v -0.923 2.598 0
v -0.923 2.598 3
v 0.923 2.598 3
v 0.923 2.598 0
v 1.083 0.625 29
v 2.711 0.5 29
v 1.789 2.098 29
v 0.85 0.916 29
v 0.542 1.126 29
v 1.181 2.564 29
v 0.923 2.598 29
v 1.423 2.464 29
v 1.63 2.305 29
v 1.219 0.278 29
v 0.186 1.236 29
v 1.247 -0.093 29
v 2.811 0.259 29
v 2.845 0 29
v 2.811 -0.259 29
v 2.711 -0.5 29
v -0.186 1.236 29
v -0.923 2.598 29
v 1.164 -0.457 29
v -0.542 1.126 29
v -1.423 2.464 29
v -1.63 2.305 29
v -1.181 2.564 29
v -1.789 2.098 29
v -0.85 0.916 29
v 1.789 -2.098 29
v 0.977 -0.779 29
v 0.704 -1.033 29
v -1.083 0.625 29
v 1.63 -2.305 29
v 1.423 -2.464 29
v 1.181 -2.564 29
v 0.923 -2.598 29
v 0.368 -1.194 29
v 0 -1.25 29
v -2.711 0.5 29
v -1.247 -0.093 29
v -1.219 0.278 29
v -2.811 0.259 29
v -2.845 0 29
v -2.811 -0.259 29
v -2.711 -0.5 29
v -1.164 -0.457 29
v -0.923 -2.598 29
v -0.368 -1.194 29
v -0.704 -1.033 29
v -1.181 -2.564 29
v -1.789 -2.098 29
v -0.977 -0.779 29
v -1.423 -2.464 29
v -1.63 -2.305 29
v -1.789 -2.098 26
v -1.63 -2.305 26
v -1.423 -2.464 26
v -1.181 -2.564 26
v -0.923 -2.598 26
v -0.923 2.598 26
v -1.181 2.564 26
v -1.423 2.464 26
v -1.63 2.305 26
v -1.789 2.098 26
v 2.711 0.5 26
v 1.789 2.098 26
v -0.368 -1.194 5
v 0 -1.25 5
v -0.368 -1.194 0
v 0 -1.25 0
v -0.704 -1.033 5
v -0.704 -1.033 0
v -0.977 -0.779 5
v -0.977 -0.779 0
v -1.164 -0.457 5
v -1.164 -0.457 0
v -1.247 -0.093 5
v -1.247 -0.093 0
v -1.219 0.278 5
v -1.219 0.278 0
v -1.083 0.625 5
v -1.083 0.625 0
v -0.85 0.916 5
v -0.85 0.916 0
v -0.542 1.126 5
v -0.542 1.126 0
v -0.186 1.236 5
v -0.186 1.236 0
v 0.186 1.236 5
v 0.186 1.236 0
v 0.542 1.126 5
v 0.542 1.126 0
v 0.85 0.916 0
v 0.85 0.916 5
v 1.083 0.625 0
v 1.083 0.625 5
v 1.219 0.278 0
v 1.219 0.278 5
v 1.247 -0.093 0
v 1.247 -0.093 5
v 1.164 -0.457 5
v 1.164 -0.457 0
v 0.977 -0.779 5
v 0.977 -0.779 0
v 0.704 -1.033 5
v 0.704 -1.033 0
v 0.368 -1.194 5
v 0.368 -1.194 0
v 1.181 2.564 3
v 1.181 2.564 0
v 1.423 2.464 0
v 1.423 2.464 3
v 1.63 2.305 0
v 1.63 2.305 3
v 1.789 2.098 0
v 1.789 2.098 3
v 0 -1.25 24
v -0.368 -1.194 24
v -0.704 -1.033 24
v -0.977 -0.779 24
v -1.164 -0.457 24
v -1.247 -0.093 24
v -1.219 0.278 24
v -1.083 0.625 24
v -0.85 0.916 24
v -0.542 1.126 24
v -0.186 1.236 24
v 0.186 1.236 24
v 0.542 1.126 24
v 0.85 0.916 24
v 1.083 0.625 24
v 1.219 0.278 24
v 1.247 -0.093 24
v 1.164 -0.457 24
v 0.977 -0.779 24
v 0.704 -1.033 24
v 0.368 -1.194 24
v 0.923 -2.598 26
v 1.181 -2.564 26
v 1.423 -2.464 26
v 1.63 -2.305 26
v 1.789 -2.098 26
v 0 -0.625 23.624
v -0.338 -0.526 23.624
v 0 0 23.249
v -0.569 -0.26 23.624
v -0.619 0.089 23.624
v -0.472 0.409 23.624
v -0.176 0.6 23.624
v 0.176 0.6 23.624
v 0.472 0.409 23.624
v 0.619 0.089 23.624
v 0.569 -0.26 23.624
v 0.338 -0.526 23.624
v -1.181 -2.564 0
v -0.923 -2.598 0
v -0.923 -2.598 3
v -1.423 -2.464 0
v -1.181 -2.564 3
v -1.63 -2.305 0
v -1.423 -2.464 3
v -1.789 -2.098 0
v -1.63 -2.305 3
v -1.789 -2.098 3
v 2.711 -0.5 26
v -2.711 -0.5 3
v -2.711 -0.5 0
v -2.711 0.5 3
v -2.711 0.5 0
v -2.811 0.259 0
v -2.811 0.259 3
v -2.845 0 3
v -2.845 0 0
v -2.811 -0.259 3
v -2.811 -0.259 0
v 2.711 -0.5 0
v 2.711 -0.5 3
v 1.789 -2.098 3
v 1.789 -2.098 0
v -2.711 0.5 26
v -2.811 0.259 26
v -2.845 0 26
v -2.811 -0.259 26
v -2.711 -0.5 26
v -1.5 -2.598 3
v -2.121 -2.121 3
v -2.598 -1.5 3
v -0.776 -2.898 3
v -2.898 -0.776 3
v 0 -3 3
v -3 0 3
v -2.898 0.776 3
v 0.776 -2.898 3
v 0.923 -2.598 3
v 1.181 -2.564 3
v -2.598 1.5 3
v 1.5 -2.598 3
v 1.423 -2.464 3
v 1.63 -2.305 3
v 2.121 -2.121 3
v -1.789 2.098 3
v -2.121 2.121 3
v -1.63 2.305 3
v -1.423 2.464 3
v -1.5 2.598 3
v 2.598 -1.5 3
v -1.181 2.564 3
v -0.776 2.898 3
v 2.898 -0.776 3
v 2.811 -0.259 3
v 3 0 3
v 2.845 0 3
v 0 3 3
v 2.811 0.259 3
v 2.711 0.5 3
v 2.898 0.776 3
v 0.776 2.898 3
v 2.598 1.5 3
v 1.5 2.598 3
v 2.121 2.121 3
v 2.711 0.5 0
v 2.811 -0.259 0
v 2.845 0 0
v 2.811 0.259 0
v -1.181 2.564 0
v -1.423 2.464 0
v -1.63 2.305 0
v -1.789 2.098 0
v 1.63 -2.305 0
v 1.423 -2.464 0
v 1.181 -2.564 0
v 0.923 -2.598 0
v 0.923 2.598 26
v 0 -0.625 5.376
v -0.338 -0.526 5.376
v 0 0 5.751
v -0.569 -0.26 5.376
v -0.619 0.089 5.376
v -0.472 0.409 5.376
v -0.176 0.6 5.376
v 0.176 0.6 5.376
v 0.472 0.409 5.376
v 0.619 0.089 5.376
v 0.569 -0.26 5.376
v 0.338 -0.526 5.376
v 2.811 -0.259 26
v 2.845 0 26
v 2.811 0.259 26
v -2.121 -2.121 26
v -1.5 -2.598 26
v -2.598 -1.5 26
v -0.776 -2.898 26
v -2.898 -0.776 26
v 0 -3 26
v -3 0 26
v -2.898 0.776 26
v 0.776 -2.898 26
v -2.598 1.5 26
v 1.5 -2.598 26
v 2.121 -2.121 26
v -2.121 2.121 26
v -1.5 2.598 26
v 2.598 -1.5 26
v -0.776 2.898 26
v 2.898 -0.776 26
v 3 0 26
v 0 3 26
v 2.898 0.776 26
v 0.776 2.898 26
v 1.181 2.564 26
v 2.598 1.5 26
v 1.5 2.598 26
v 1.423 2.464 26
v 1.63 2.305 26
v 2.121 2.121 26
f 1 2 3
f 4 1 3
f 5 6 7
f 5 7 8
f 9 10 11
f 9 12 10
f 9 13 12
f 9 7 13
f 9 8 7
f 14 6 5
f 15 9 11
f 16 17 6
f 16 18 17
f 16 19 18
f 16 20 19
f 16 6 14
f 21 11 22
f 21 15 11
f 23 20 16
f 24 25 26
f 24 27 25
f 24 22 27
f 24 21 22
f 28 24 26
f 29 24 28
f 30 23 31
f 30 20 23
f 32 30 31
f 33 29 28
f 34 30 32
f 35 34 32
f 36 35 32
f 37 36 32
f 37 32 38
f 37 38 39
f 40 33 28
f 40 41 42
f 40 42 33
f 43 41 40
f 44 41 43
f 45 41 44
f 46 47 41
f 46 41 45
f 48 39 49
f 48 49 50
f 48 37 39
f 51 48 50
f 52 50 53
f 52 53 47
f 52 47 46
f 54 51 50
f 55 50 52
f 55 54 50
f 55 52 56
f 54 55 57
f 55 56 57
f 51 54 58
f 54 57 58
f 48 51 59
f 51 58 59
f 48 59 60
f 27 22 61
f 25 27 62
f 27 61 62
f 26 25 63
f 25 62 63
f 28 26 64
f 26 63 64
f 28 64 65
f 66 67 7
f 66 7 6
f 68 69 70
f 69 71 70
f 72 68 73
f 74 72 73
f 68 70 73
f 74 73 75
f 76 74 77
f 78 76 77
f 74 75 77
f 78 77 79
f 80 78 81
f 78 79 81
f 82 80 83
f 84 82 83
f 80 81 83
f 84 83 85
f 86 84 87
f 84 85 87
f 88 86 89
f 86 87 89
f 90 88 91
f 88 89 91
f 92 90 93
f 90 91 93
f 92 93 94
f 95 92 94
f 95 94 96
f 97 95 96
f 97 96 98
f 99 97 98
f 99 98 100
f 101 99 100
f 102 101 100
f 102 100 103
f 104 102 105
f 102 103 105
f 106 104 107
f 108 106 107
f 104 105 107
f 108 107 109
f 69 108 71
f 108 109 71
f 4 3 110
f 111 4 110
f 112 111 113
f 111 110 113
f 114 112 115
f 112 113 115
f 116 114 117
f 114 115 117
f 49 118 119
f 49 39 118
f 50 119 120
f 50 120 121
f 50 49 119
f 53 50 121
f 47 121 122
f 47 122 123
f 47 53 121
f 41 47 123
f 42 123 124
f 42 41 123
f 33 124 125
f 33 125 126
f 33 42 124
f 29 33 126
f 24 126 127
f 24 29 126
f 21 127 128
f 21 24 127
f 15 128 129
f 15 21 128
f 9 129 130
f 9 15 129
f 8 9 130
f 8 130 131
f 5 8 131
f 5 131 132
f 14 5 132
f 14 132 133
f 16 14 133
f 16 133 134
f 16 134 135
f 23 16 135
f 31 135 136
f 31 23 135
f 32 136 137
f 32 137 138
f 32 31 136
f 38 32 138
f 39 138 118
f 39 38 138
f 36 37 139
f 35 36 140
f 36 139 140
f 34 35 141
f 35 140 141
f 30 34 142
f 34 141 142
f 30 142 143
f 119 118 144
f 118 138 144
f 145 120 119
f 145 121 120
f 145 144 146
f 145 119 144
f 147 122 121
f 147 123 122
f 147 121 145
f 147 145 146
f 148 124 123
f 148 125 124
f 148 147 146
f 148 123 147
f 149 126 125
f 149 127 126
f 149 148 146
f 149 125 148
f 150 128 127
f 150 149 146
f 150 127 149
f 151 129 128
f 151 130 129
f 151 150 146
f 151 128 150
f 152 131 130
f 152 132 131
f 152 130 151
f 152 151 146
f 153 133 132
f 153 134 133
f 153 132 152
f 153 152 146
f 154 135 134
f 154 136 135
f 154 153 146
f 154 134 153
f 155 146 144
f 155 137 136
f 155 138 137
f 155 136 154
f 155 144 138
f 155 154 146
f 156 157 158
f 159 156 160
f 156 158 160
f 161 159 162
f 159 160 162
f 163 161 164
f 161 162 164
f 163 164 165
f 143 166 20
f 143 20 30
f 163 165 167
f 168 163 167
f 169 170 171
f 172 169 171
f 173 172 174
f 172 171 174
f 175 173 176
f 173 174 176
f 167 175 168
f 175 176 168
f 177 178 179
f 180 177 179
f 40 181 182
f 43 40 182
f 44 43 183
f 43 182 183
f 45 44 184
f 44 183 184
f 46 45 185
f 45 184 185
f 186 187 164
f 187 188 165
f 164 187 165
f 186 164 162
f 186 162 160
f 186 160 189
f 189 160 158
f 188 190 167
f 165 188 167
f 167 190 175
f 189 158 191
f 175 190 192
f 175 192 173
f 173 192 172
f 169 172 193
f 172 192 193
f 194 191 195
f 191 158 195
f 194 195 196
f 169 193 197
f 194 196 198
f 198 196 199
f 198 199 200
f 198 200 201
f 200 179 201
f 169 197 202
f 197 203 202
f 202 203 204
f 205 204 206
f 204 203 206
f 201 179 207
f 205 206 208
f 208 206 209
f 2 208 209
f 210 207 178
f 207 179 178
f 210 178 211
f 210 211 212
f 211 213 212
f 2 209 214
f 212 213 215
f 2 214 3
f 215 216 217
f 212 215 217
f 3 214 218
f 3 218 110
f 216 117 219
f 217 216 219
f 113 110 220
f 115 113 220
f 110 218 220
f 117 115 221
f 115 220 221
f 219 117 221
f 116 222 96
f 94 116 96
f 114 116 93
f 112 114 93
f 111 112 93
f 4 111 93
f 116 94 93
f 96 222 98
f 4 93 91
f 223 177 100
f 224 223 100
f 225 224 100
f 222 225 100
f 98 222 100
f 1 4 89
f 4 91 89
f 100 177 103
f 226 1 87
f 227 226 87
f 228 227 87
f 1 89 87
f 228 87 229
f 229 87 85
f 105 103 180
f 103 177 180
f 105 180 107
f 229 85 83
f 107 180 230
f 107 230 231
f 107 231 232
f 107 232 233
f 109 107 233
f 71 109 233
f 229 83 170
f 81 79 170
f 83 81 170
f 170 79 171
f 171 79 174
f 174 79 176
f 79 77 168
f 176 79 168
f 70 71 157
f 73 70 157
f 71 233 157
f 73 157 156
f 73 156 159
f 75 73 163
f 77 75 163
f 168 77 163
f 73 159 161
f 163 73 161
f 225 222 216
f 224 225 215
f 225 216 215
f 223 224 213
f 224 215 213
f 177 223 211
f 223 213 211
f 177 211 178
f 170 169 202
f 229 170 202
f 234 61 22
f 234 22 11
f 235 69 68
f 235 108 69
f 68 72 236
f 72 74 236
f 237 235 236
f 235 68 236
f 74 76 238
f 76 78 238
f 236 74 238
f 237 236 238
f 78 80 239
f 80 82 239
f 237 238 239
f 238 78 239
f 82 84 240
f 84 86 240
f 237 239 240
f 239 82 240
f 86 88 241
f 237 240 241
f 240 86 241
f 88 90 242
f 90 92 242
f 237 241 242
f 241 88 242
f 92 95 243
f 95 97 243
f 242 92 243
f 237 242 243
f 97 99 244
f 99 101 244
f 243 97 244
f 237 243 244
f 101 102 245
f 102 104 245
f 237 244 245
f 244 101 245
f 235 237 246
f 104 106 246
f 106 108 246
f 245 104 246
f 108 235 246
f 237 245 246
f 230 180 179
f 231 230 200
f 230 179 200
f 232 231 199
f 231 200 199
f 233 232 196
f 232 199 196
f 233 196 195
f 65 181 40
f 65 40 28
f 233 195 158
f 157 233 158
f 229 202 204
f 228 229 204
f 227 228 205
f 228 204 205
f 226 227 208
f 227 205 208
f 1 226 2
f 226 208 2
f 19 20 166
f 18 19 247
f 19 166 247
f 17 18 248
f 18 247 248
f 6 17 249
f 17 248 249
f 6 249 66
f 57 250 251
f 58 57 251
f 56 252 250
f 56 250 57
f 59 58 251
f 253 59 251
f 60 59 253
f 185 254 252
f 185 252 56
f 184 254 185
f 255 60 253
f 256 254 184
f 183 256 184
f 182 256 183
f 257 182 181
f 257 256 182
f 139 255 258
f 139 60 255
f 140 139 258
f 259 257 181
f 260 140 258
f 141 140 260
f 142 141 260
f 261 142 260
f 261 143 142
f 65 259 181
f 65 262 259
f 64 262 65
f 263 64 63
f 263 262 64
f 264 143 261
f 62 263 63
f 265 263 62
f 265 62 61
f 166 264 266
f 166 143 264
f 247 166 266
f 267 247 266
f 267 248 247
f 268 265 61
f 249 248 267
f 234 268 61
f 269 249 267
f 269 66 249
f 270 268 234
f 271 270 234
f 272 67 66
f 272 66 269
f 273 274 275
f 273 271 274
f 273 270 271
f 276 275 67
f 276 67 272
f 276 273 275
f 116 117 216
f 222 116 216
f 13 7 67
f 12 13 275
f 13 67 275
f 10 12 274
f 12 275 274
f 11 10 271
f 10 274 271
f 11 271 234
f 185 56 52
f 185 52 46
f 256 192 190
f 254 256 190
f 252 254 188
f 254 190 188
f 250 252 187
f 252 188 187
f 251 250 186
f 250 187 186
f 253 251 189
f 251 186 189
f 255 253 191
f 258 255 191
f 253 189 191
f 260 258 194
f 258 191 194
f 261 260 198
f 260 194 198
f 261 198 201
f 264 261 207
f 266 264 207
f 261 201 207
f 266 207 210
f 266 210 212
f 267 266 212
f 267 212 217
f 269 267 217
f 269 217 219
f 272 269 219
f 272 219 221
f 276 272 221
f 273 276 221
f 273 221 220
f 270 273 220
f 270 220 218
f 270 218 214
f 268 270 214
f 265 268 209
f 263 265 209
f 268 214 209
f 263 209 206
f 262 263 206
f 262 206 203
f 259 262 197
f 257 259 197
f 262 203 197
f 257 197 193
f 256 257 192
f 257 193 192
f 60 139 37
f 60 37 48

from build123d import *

# Parameters (mm, degrees)
SKETCH1_R           = 3
BOSS_EXTRUDE1_DEPTH = 29
CUT_EXTRUDE1_START  = -3
CUT_EXTRUDE1_DEPTH  = 3
FILLET1_R           = 1


with BuildPart() as part:
    # Sketch1 → Boss-Extrude1 (new body)
    with BuildSketch(Plane.XY):
        with Locations(Location((0, 0, 0), (0, 0, 180))):
            Circle(SKETCH1_R)
    extrude(amount=BOSS_EXTRUDE1_DEPTH)

    # Sketch3 → Cut-Extrude1 (cut)
    with BuildSketch(Plane.XY.offset(29).offset(CUT_EXTRUDE1_START)):
        with BuildLine():
            Line((-3, 0), (-1.5, 2.598076211))
            ThreePointArc((-1.5, 2.598076211), (-2.598076211, 1.5), (-3, 0))
        make_face()
        with BuildLine():
            Line((1.5, 2.598076211), (3, 0))
            ThreePointArc((3, 0), (2.598076211, 1.5), (1.5, 2.598076211))
        make_face()
        with BuildLine():
            Line((-1.5, 2.598076211), (1.5, 2.598076211))
            ThreePointArc((1.5, 2.598076211), (0, 3), (-1.5, 2.598076211))
        make_face()
        with BuildLine():
            ThreePointArc((-3, 0), (-2.598076211, -1.5), (-1.5, -2.598076211))
            Line((-1.5, -2.598076211), (-3, 0))
        make_face()
        with BuildLine():
            ThreePointArc((-1.5, -2.598076211), (0, -3), (1.5, -2.598076211))
            Line((1.5, -2.598076211), (-1.5, -2.598076211))
        make_face()
        with BuildLine():
            ThreePointArc((1.5, -2.598076211), (2.598076211, -1.5), (3, 0))
            Line((3, 0), (1.5, -2.598076211))
        make_face()
    cut_extrude1 = extrude(amount=CUT_EXTRUDE1_DEPTH, mode=Mode.SUBTRACT)

    # Mirror1: Cut-Extrude1 across plane
    add(cut_extrude1.mirror(Plane(origin=(0, 0, 14.5), x_dir=(1, 0, 0), z_dir=(0, 0, -1))), mode=Mode.SUBTRACT)

    # Sketch6 → Tap Drill for M3x0.5 Tap1 (revolve, cut)
    with BuildSketch(Plane(origin=(0, 0, 29), x_dir=(0, -1, 0), z_dir=(1, 0, 0))):
        Polygon((0, 0), (0, 5.751075774), (1.25, 5), (1.25, 0), align=None)
    tap_drill_for_m3x0_5_tap1 = revolve(axis=Axis((0, 0, 35.35), (0, 0, -1)), mode=Mode.SUBTRACT)

    # Mirror2: Tap Drill for M3x0.5 Tap1 across plane
    add(tap_drill_for_m3x0_5_tap1.mirror(Plane(origin=(0, 0, 14.5), x_dir=(1, 0, 0), z_dir=(0, 0, -1))), mode=Mode.SUBTRACT)

    # Fillet1
    # the kernel refuses this fillet: 1 mm, written as the material it takes off along each edge
    with BuildSketch(Plane(origin=(-1.5, 2.598076211, 26), x_dir=(-0.4999999999999951, -0.8660254037844416, 0), z_dir=(0, 0, 1)), Plane(origin=(3, 0, 26), x_dir=(-0.5000000000000018, 0.8660254037844377, 0), z_dir=(0, 0, 1)), Plane(origin=(1.5, 2.598076211, 26), x_dir=(-1, 0, 0), z_dir=(0, 0, 1)), Plane(origin=(1.5, -2.598076211, 26), x_dir=(0.4999999999999949, 0.8660254037844417, 0), z_dir=(0, 0, 1)), Plane(origin=(-1.5, -2.598076211, 26), x_dir=(1, 0, 0), z_dir=(0, 0, 1)), Plane(origin=(-3, 0, -1.443375673), x_dir=(0.500000000000007, -0.8660254037844346, 0), z_dir=(0, 0, 1)), Plane(origin=(3, 0, 3), x_dir=(-0.4999999999999955, -0.8660254037844413, 0), z_dir=(0, 0, -1)), Plane(origin=(1.5, -2.598076211, 3), x_dir=(-1, 0, 0), z_dir=(0, 0, -1)), Plane(origin=(-1.5, -2.598076211, 3), x_dir=(-0.5000000000000073, 0.8660254037844345, 0), z_dir=(0, 0, -1))) as fillet1_piece_1:
        with BuildLine():
            CenterArc((FILLET1_R * 0.57735026919, FILLET1_R), FILLET1_R, 210, 60)
            Line((-FILLET1_R * 0.288675134595, FILLET1_R * 0.5), (0, 0))
            Line((0, 0), (FILLET1_R * 0.57735026919, 0))
        make_face()
    extrude(amount=4.443375673, mode=Mode.SUBTRACT)
    with BuildSketch(Plane(origin=(-3, 0, 26), x_dir=(0.5000000000000109, 0.8660254037844323, 0), z_dir=(0, 0, 1)), Plane(origin=(-1.5, 2.598076211, 3), x_dir=(-0.4999999999999951, -0.8660254037844416, 0), z_dir=(0, 0, -1)), Plane(origin=(1.5, 2.598076211, 3), x_dir=(-1, 0, 0), z_dir=(0, 0, -1))) as fillet1_piece_2:
        with BuildLine():
            CenterArc((FILLET1_R * 0.57735026919, -FILLET1_R), FILLET1_R, 90, 60)
            Line((-FILLET1_R * 0.288675134595, -FILLET1_R * 0.5), (0, 0))
            Line((0, 0), (FILLET1_R * 0.57735026919, 0))
        make_face()
    extrude(amount=4.443375673, mode=Mode.SUBTRACT)


solid = part.part
